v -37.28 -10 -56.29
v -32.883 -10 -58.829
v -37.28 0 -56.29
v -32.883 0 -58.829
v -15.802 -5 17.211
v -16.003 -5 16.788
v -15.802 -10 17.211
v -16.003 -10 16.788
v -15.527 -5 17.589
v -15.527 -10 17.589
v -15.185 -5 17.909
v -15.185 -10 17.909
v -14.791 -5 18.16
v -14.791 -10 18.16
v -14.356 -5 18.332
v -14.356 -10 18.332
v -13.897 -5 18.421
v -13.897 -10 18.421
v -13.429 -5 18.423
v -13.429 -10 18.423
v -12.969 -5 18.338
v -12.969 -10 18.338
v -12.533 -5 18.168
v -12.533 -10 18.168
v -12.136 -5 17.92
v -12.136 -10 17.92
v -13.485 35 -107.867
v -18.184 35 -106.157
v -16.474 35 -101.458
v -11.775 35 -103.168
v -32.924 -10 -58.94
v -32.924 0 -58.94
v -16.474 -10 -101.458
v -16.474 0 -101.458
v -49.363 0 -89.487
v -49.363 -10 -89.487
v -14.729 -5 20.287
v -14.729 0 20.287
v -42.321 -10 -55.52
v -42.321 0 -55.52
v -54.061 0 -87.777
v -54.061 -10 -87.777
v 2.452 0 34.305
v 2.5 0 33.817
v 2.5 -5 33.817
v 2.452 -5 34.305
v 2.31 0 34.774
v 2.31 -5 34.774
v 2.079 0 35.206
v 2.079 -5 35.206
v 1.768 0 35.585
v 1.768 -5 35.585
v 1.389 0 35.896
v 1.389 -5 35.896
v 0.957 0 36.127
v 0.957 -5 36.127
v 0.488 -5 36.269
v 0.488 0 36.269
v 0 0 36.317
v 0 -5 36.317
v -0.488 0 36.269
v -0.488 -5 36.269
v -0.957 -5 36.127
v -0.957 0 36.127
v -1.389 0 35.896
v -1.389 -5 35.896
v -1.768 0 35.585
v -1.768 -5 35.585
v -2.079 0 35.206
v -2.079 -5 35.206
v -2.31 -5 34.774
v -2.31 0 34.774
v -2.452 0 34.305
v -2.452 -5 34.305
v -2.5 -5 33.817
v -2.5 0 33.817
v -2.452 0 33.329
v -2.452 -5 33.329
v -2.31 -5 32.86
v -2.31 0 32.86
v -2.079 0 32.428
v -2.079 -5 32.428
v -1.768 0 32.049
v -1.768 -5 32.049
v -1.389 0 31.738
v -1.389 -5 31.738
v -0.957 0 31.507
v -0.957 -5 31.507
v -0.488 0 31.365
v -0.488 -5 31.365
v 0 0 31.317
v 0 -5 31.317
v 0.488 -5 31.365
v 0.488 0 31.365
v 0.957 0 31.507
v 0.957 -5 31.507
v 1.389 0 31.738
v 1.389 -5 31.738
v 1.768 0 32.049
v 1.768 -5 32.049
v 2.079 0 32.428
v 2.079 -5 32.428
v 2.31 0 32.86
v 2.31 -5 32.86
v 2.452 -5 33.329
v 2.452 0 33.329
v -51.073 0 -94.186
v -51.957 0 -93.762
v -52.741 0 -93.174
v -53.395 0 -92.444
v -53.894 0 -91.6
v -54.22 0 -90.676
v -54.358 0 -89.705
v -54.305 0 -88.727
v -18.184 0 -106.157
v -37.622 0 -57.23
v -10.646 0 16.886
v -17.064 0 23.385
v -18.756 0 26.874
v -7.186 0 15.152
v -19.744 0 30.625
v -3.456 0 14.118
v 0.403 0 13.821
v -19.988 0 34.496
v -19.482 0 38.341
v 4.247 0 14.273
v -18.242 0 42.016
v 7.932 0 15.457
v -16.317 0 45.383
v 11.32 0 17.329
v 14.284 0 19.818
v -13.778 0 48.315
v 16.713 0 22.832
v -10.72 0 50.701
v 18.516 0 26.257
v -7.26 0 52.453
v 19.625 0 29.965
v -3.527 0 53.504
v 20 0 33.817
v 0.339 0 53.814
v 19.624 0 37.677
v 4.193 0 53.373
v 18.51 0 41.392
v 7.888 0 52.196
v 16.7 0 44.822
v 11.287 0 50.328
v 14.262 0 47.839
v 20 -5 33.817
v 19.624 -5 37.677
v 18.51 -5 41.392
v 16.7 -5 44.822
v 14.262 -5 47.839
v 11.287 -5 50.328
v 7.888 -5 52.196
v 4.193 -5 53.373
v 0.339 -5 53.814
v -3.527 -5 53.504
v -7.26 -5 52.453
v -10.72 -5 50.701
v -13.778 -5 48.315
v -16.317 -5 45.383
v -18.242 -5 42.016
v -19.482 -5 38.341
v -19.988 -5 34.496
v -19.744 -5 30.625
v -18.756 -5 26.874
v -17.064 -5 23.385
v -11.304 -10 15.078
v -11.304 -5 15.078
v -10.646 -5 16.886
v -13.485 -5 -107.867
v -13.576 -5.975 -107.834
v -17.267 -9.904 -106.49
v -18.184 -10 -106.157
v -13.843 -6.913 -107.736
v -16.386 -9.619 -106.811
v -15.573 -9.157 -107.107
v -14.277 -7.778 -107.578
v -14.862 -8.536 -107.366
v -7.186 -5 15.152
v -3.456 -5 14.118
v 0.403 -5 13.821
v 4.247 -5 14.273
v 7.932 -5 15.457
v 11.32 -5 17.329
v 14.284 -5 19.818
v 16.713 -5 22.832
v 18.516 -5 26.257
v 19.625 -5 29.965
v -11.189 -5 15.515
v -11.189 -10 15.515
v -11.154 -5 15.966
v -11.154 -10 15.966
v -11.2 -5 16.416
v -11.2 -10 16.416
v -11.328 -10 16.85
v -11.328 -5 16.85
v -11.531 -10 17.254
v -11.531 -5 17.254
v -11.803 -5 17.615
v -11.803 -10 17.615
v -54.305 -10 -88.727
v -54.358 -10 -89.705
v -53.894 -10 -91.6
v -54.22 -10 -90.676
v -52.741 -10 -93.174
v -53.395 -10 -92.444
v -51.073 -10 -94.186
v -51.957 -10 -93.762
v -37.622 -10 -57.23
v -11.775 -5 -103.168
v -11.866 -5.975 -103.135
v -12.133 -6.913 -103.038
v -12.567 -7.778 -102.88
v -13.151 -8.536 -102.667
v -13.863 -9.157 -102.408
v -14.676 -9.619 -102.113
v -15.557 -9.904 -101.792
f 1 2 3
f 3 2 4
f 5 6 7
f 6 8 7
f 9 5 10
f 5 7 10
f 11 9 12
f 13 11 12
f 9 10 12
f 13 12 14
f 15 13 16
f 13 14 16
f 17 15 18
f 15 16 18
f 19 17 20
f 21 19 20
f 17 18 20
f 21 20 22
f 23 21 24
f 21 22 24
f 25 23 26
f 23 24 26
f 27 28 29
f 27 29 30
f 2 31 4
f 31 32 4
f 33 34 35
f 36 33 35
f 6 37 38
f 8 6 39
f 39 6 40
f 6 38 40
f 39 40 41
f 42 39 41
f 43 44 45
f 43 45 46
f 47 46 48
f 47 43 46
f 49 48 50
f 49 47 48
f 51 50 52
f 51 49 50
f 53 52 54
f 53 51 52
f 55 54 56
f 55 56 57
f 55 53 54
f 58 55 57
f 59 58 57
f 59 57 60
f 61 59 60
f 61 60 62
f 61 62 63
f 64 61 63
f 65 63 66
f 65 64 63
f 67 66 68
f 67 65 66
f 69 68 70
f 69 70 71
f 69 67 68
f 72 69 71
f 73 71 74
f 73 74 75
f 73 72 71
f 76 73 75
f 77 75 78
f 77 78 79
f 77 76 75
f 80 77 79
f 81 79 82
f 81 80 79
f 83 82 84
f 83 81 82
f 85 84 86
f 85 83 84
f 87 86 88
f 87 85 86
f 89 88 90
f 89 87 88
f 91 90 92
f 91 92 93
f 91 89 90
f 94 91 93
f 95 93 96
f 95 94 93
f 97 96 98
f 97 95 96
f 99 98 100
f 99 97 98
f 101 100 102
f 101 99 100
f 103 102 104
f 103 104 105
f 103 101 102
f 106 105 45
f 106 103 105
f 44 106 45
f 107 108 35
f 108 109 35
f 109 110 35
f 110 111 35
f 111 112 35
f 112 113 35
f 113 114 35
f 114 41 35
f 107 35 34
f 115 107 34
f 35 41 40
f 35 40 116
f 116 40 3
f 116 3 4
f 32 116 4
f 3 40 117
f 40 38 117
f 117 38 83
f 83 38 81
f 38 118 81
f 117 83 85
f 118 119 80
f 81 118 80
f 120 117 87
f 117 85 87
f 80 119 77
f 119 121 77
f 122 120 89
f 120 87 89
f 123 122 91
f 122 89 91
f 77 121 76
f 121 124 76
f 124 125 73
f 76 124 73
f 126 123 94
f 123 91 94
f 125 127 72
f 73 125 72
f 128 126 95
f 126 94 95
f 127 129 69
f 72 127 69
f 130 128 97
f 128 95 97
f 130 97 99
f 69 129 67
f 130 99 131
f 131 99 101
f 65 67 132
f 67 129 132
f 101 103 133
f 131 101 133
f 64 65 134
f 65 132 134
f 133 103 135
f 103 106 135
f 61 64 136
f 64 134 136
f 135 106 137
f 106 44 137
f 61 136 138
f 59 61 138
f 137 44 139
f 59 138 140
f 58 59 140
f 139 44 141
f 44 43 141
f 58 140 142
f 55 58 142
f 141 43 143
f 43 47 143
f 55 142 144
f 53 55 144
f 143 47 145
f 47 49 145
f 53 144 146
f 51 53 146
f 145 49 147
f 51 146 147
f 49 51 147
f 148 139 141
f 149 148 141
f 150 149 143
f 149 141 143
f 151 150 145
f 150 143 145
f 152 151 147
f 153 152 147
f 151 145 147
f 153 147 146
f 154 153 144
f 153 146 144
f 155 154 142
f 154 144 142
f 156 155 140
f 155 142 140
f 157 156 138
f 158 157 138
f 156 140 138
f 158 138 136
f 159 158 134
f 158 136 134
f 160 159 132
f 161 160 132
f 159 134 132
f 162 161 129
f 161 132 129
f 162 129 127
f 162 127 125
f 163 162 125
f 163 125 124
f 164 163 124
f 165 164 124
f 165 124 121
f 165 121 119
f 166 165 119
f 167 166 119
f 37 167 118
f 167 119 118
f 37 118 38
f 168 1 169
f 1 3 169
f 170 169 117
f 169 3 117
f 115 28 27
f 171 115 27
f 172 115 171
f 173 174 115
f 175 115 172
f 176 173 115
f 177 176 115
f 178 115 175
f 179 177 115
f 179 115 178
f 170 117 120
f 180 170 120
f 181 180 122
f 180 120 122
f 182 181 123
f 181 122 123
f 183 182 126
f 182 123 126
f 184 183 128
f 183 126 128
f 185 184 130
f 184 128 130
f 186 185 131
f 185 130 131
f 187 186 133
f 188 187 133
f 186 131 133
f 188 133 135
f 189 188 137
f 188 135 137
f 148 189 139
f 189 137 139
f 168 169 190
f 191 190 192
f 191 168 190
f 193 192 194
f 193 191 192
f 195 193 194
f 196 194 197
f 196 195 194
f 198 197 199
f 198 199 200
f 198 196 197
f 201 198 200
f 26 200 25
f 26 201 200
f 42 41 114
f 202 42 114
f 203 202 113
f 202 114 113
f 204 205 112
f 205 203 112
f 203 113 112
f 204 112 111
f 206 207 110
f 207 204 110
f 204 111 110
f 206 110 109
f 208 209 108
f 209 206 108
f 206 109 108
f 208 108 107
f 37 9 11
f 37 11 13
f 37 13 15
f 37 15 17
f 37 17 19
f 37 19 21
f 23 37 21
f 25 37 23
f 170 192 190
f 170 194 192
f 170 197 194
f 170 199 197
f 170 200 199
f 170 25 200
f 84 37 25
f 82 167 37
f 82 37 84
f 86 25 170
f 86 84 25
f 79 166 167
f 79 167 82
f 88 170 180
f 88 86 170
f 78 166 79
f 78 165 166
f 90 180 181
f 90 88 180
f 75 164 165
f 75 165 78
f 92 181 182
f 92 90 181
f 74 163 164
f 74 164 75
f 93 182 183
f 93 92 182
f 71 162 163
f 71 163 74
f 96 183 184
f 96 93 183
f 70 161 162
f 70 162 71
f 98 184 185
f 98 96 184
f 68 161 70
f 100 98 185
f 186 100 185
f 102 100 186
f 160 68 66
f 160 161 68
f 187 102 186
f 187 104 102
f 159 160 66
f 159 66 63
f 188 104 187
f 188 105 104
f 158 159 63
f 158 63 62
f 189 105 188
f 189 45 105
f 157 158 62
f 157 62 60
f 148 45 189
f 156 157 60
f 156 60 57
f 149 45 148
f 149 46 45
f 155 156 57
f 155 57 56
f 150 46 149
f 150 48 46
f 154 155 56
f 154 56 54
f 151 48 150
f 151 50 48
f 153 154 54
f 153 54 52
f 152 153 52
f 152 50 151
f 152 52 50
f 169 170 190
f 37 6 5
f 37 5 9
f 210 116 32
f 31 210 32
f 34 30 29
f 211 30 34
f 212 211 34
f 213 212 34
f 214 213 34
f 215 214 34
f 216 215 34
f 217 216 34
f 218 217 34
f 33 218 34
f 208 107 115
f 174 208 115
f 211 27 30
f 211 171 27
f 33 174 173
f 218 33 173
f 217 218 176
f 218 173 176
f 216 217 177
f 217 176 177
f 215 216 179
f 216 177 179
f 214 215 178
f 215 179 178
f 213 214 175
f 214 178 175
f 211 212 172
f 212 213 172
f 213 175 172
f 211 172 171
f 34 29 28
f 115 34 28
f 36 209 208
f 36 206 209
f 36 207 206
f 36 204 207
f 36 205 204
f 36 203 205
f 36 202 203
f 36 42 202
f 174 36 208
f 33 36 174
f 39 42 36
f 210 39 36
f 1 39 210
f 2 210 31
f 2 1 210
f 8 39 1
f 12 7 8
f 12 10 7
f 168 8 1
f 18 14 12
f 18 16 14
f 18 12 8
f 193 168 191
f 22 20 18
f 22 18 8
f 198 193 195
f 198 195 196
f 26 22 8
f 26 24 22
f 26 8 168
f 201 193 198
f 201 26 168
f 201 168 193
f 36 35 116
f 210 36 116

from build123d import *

# Parameters (mm, degrees)
F0_R        = 2.5
F1_DEPTH    = 5
F2_DEPTH    = 10
F3_R        = 2.49999
F4_T1_DEPTH = 35
F4_T3_DEPTH = 30
F5_SIZE2    = 0.881625
F5_SIZE     = 4.99999
F6_DEPTH    = 35


# Not quite as in the source:
# - a fillet or chamfer that OpenCascade refuses, or shapes differently, is made with other operations: its cross-section is extruded or revolved along the edge and cut away or added
# - a fillet or chamfer is up to 0.001 mm smaller than in the source, because OpenCascade refuses the exact size


with BuildPart() as f1:
    # F0 (on Front) → F1 (new body)
    with BuildSketch(Plane.XZ):
        with BuildLine():
            ThreePointArc((20, 33.8170940264), (-7.2600924867, 52.4528407806), (-14.7291057085, 20.287369527))
            ThreePointArc((-14.7291057085, 20.287369527), (-12.8011117725, 18.4505219497), (-10.6461806987, 16.8860917959))
            ThreePointArc((-10.6461806987, 16.8860917959), (9.671514515, 16.3110434442), (20, 33.8170940264))
        make_face()
        with Locations((0, 33.8170940264)):
            Circle(F0_R, mode=Mode.SUBTRACT)
        with BuildLine():
            Line((-42.3206788698, -55.5198547009), (-37.6222157658, -57.2299554175))
            Line((-37.6222157658, -57.2299554175), (-37.2801956225, -56.2902627967))
            Line((-37.2801956225, -56.2902627967), (-10.6461806987, 16.8860917959))
            ThreePointArc((-10.6461806987, 16.8860917959), (-12.8011117725, 18.4505219497), (-14.7291057085, 20.287369527))
            Line((-14.7291057085, 20.287369527), (-42.3206788698, -55.5198547009))
        make_face()
        Polygon((-37.2801956225, -56.2902627967), (-37.6222157658, -57.2299554175), (-32.9237526619, -58.9400561341), (-32.5817325186, -58.0003635134), align=None)
        Polygon((-49.362959087, -89.48738258), (-37.6222157658, -57.2299554175), (-42.3206788698, -55.5198547009), (-55.7715229075, -92.4757449673), (-51.0730598036, -94.1858456839), align=None)
        Polygon((-16.4737173595, -101.4580875964), (-49.362959087, -89.48738258), (-51.0730598036, -94.1858456839), (-18.1838180761, -106.1565507003), align=None)
        Polygon((-11.7752542555, -103.168188313), (-16.4737173595, -101.4580875964), (-18.1838180761, -106.1565507003), (-13.4853549722, -107.8666514169), align=None)
    extrude(amount=F1_DEPTH)

    # F0 (on Front) → F2 (join)
    with BuildSketch(Plane.XZ):
        with BuildLine():
            Line((-42.3206788698, -55.5198547009), (-37.6222157658, -57.2299554175))
            Line((-37.6222157658, -57.2299554175), (-37.2801956225, -56.2902627967))
            Line((-37.2801956225, -56.2902627967), (-10.6461806987, 16.8860917959))
            ThreePointArc((-10.6461806987, 16.8860917959), (-12.8011117725, 18.4505219497), (-14.7291057085, 20.287369527))
            Line((-14.7291057085, 20.287369527), (-42.3206788698, -55.5198547009))
        make_face()
        Polygon((-49.362959087, -89.48738258), (-37.6222157658, -57.2299554175), (-42.3206788698, -55.5198547009), (-55.7715229075, -92.4757449673), (-51.0730598036, -94.1858456839), align=None)
        Polygon((-16.4737173595, -101.4580875964), (-49.362959087, -89.48738258), (-51.0730598036, -94.1858456839), (-18.1838180761, -106.1565507003), align=None)
        Polygon((-11.7752542555, -103.168188313), (-16.4737173595, -101.4580875964), (-18.1838180761, -106.1565507003), (-13.4853549722, -107.8666514169), align=None)
        Polygon((-37.2801956225, -56.2902627967), (-37.6222157658, -57.2299554175), (-32.9237526619, -58.9400561341), (-32.5817325186, -58.0003635134), align=None)
    extrude(amount=F2_DEPTH)

    # F3 (radius 2.5 in the source; OpenCascade refuses exactly that, so slightly less here)
    f3_edges = [f1.edges().sort_by_distance(p)[0] for p in [
        (-10.646181, -7.5, 16.886092),
        (-14.729106, -7.5, 20.28737),
    ]]
    fillet(f3_edges, radius=F3_R)

    # F4: fillet of radius 5 on 2 edges, made by hand

    # F4_s2 → F4_t1 (cut)
    with BuildSketch(Plane.XZ.offset(-12.5)):
        with BuildLine():
            ThreePointArc((-54.0614221909, -87.7772818634), (-53.8944980222, -91.6004738887), (-51.0730598036, -94.1858456839))
            Line((-51.0730598036, -94.1858456839), (-55.7715229075, -92.4757449673))
            Line((-55.7715229075, -92.4757449673), (-54.0614221909, -87.7772818634))
        make_face()
    extrude(amount=F4_T1_DEPTH, mode=Mode.SUBTRACT)

    # F4_s4 → F4_t3 (cut)
    with BuildSketch(Plane(origin=(-40.5204121723, 0, -111.3289174704), x_dir=(0, 1, 0), z_dir=(0.3420201433, 0, 0.9396926208))):
        with BuildLine():
            ThreePointArc((-10, -19.2204790217), (-8.5355339059, -22.7560129276), (-5, -24.2204790217))
            Line((-5, -24.2204790217), (-10, -24.2204790217))
            Line((-10, -24.2204790217), (-10, -19.2204790217))
        make_face()
    extrude(amount=F4_T3_DEPTH, mode=Mode.SUBTRACT)

    # F5 (size 5 and 0.8816349035 in the source; OpenCascade refuses exactly that, so slightly less here)
    f5_edges = [f1.edges().sort_by_distance(p)[0] for p in [
        (-32.581733, -5, -58.000364),
    ]]
    chamfer(f5_edges, length=F5_SIZE, length2=F5_SIZE2)

    # F0 (on Front) → F6 (join)
    with BuildSketch(Plane.XZ):
        Polygon((-11.7752542555, -103.168188313), (-16.4737173595, -101.4580875964), (-18.1838180761, -106.1565507003), (-13.4853549722, -107.8666514169), align=None)
    extrude(amount=-F6_DEPTH)


solid = f1.part
